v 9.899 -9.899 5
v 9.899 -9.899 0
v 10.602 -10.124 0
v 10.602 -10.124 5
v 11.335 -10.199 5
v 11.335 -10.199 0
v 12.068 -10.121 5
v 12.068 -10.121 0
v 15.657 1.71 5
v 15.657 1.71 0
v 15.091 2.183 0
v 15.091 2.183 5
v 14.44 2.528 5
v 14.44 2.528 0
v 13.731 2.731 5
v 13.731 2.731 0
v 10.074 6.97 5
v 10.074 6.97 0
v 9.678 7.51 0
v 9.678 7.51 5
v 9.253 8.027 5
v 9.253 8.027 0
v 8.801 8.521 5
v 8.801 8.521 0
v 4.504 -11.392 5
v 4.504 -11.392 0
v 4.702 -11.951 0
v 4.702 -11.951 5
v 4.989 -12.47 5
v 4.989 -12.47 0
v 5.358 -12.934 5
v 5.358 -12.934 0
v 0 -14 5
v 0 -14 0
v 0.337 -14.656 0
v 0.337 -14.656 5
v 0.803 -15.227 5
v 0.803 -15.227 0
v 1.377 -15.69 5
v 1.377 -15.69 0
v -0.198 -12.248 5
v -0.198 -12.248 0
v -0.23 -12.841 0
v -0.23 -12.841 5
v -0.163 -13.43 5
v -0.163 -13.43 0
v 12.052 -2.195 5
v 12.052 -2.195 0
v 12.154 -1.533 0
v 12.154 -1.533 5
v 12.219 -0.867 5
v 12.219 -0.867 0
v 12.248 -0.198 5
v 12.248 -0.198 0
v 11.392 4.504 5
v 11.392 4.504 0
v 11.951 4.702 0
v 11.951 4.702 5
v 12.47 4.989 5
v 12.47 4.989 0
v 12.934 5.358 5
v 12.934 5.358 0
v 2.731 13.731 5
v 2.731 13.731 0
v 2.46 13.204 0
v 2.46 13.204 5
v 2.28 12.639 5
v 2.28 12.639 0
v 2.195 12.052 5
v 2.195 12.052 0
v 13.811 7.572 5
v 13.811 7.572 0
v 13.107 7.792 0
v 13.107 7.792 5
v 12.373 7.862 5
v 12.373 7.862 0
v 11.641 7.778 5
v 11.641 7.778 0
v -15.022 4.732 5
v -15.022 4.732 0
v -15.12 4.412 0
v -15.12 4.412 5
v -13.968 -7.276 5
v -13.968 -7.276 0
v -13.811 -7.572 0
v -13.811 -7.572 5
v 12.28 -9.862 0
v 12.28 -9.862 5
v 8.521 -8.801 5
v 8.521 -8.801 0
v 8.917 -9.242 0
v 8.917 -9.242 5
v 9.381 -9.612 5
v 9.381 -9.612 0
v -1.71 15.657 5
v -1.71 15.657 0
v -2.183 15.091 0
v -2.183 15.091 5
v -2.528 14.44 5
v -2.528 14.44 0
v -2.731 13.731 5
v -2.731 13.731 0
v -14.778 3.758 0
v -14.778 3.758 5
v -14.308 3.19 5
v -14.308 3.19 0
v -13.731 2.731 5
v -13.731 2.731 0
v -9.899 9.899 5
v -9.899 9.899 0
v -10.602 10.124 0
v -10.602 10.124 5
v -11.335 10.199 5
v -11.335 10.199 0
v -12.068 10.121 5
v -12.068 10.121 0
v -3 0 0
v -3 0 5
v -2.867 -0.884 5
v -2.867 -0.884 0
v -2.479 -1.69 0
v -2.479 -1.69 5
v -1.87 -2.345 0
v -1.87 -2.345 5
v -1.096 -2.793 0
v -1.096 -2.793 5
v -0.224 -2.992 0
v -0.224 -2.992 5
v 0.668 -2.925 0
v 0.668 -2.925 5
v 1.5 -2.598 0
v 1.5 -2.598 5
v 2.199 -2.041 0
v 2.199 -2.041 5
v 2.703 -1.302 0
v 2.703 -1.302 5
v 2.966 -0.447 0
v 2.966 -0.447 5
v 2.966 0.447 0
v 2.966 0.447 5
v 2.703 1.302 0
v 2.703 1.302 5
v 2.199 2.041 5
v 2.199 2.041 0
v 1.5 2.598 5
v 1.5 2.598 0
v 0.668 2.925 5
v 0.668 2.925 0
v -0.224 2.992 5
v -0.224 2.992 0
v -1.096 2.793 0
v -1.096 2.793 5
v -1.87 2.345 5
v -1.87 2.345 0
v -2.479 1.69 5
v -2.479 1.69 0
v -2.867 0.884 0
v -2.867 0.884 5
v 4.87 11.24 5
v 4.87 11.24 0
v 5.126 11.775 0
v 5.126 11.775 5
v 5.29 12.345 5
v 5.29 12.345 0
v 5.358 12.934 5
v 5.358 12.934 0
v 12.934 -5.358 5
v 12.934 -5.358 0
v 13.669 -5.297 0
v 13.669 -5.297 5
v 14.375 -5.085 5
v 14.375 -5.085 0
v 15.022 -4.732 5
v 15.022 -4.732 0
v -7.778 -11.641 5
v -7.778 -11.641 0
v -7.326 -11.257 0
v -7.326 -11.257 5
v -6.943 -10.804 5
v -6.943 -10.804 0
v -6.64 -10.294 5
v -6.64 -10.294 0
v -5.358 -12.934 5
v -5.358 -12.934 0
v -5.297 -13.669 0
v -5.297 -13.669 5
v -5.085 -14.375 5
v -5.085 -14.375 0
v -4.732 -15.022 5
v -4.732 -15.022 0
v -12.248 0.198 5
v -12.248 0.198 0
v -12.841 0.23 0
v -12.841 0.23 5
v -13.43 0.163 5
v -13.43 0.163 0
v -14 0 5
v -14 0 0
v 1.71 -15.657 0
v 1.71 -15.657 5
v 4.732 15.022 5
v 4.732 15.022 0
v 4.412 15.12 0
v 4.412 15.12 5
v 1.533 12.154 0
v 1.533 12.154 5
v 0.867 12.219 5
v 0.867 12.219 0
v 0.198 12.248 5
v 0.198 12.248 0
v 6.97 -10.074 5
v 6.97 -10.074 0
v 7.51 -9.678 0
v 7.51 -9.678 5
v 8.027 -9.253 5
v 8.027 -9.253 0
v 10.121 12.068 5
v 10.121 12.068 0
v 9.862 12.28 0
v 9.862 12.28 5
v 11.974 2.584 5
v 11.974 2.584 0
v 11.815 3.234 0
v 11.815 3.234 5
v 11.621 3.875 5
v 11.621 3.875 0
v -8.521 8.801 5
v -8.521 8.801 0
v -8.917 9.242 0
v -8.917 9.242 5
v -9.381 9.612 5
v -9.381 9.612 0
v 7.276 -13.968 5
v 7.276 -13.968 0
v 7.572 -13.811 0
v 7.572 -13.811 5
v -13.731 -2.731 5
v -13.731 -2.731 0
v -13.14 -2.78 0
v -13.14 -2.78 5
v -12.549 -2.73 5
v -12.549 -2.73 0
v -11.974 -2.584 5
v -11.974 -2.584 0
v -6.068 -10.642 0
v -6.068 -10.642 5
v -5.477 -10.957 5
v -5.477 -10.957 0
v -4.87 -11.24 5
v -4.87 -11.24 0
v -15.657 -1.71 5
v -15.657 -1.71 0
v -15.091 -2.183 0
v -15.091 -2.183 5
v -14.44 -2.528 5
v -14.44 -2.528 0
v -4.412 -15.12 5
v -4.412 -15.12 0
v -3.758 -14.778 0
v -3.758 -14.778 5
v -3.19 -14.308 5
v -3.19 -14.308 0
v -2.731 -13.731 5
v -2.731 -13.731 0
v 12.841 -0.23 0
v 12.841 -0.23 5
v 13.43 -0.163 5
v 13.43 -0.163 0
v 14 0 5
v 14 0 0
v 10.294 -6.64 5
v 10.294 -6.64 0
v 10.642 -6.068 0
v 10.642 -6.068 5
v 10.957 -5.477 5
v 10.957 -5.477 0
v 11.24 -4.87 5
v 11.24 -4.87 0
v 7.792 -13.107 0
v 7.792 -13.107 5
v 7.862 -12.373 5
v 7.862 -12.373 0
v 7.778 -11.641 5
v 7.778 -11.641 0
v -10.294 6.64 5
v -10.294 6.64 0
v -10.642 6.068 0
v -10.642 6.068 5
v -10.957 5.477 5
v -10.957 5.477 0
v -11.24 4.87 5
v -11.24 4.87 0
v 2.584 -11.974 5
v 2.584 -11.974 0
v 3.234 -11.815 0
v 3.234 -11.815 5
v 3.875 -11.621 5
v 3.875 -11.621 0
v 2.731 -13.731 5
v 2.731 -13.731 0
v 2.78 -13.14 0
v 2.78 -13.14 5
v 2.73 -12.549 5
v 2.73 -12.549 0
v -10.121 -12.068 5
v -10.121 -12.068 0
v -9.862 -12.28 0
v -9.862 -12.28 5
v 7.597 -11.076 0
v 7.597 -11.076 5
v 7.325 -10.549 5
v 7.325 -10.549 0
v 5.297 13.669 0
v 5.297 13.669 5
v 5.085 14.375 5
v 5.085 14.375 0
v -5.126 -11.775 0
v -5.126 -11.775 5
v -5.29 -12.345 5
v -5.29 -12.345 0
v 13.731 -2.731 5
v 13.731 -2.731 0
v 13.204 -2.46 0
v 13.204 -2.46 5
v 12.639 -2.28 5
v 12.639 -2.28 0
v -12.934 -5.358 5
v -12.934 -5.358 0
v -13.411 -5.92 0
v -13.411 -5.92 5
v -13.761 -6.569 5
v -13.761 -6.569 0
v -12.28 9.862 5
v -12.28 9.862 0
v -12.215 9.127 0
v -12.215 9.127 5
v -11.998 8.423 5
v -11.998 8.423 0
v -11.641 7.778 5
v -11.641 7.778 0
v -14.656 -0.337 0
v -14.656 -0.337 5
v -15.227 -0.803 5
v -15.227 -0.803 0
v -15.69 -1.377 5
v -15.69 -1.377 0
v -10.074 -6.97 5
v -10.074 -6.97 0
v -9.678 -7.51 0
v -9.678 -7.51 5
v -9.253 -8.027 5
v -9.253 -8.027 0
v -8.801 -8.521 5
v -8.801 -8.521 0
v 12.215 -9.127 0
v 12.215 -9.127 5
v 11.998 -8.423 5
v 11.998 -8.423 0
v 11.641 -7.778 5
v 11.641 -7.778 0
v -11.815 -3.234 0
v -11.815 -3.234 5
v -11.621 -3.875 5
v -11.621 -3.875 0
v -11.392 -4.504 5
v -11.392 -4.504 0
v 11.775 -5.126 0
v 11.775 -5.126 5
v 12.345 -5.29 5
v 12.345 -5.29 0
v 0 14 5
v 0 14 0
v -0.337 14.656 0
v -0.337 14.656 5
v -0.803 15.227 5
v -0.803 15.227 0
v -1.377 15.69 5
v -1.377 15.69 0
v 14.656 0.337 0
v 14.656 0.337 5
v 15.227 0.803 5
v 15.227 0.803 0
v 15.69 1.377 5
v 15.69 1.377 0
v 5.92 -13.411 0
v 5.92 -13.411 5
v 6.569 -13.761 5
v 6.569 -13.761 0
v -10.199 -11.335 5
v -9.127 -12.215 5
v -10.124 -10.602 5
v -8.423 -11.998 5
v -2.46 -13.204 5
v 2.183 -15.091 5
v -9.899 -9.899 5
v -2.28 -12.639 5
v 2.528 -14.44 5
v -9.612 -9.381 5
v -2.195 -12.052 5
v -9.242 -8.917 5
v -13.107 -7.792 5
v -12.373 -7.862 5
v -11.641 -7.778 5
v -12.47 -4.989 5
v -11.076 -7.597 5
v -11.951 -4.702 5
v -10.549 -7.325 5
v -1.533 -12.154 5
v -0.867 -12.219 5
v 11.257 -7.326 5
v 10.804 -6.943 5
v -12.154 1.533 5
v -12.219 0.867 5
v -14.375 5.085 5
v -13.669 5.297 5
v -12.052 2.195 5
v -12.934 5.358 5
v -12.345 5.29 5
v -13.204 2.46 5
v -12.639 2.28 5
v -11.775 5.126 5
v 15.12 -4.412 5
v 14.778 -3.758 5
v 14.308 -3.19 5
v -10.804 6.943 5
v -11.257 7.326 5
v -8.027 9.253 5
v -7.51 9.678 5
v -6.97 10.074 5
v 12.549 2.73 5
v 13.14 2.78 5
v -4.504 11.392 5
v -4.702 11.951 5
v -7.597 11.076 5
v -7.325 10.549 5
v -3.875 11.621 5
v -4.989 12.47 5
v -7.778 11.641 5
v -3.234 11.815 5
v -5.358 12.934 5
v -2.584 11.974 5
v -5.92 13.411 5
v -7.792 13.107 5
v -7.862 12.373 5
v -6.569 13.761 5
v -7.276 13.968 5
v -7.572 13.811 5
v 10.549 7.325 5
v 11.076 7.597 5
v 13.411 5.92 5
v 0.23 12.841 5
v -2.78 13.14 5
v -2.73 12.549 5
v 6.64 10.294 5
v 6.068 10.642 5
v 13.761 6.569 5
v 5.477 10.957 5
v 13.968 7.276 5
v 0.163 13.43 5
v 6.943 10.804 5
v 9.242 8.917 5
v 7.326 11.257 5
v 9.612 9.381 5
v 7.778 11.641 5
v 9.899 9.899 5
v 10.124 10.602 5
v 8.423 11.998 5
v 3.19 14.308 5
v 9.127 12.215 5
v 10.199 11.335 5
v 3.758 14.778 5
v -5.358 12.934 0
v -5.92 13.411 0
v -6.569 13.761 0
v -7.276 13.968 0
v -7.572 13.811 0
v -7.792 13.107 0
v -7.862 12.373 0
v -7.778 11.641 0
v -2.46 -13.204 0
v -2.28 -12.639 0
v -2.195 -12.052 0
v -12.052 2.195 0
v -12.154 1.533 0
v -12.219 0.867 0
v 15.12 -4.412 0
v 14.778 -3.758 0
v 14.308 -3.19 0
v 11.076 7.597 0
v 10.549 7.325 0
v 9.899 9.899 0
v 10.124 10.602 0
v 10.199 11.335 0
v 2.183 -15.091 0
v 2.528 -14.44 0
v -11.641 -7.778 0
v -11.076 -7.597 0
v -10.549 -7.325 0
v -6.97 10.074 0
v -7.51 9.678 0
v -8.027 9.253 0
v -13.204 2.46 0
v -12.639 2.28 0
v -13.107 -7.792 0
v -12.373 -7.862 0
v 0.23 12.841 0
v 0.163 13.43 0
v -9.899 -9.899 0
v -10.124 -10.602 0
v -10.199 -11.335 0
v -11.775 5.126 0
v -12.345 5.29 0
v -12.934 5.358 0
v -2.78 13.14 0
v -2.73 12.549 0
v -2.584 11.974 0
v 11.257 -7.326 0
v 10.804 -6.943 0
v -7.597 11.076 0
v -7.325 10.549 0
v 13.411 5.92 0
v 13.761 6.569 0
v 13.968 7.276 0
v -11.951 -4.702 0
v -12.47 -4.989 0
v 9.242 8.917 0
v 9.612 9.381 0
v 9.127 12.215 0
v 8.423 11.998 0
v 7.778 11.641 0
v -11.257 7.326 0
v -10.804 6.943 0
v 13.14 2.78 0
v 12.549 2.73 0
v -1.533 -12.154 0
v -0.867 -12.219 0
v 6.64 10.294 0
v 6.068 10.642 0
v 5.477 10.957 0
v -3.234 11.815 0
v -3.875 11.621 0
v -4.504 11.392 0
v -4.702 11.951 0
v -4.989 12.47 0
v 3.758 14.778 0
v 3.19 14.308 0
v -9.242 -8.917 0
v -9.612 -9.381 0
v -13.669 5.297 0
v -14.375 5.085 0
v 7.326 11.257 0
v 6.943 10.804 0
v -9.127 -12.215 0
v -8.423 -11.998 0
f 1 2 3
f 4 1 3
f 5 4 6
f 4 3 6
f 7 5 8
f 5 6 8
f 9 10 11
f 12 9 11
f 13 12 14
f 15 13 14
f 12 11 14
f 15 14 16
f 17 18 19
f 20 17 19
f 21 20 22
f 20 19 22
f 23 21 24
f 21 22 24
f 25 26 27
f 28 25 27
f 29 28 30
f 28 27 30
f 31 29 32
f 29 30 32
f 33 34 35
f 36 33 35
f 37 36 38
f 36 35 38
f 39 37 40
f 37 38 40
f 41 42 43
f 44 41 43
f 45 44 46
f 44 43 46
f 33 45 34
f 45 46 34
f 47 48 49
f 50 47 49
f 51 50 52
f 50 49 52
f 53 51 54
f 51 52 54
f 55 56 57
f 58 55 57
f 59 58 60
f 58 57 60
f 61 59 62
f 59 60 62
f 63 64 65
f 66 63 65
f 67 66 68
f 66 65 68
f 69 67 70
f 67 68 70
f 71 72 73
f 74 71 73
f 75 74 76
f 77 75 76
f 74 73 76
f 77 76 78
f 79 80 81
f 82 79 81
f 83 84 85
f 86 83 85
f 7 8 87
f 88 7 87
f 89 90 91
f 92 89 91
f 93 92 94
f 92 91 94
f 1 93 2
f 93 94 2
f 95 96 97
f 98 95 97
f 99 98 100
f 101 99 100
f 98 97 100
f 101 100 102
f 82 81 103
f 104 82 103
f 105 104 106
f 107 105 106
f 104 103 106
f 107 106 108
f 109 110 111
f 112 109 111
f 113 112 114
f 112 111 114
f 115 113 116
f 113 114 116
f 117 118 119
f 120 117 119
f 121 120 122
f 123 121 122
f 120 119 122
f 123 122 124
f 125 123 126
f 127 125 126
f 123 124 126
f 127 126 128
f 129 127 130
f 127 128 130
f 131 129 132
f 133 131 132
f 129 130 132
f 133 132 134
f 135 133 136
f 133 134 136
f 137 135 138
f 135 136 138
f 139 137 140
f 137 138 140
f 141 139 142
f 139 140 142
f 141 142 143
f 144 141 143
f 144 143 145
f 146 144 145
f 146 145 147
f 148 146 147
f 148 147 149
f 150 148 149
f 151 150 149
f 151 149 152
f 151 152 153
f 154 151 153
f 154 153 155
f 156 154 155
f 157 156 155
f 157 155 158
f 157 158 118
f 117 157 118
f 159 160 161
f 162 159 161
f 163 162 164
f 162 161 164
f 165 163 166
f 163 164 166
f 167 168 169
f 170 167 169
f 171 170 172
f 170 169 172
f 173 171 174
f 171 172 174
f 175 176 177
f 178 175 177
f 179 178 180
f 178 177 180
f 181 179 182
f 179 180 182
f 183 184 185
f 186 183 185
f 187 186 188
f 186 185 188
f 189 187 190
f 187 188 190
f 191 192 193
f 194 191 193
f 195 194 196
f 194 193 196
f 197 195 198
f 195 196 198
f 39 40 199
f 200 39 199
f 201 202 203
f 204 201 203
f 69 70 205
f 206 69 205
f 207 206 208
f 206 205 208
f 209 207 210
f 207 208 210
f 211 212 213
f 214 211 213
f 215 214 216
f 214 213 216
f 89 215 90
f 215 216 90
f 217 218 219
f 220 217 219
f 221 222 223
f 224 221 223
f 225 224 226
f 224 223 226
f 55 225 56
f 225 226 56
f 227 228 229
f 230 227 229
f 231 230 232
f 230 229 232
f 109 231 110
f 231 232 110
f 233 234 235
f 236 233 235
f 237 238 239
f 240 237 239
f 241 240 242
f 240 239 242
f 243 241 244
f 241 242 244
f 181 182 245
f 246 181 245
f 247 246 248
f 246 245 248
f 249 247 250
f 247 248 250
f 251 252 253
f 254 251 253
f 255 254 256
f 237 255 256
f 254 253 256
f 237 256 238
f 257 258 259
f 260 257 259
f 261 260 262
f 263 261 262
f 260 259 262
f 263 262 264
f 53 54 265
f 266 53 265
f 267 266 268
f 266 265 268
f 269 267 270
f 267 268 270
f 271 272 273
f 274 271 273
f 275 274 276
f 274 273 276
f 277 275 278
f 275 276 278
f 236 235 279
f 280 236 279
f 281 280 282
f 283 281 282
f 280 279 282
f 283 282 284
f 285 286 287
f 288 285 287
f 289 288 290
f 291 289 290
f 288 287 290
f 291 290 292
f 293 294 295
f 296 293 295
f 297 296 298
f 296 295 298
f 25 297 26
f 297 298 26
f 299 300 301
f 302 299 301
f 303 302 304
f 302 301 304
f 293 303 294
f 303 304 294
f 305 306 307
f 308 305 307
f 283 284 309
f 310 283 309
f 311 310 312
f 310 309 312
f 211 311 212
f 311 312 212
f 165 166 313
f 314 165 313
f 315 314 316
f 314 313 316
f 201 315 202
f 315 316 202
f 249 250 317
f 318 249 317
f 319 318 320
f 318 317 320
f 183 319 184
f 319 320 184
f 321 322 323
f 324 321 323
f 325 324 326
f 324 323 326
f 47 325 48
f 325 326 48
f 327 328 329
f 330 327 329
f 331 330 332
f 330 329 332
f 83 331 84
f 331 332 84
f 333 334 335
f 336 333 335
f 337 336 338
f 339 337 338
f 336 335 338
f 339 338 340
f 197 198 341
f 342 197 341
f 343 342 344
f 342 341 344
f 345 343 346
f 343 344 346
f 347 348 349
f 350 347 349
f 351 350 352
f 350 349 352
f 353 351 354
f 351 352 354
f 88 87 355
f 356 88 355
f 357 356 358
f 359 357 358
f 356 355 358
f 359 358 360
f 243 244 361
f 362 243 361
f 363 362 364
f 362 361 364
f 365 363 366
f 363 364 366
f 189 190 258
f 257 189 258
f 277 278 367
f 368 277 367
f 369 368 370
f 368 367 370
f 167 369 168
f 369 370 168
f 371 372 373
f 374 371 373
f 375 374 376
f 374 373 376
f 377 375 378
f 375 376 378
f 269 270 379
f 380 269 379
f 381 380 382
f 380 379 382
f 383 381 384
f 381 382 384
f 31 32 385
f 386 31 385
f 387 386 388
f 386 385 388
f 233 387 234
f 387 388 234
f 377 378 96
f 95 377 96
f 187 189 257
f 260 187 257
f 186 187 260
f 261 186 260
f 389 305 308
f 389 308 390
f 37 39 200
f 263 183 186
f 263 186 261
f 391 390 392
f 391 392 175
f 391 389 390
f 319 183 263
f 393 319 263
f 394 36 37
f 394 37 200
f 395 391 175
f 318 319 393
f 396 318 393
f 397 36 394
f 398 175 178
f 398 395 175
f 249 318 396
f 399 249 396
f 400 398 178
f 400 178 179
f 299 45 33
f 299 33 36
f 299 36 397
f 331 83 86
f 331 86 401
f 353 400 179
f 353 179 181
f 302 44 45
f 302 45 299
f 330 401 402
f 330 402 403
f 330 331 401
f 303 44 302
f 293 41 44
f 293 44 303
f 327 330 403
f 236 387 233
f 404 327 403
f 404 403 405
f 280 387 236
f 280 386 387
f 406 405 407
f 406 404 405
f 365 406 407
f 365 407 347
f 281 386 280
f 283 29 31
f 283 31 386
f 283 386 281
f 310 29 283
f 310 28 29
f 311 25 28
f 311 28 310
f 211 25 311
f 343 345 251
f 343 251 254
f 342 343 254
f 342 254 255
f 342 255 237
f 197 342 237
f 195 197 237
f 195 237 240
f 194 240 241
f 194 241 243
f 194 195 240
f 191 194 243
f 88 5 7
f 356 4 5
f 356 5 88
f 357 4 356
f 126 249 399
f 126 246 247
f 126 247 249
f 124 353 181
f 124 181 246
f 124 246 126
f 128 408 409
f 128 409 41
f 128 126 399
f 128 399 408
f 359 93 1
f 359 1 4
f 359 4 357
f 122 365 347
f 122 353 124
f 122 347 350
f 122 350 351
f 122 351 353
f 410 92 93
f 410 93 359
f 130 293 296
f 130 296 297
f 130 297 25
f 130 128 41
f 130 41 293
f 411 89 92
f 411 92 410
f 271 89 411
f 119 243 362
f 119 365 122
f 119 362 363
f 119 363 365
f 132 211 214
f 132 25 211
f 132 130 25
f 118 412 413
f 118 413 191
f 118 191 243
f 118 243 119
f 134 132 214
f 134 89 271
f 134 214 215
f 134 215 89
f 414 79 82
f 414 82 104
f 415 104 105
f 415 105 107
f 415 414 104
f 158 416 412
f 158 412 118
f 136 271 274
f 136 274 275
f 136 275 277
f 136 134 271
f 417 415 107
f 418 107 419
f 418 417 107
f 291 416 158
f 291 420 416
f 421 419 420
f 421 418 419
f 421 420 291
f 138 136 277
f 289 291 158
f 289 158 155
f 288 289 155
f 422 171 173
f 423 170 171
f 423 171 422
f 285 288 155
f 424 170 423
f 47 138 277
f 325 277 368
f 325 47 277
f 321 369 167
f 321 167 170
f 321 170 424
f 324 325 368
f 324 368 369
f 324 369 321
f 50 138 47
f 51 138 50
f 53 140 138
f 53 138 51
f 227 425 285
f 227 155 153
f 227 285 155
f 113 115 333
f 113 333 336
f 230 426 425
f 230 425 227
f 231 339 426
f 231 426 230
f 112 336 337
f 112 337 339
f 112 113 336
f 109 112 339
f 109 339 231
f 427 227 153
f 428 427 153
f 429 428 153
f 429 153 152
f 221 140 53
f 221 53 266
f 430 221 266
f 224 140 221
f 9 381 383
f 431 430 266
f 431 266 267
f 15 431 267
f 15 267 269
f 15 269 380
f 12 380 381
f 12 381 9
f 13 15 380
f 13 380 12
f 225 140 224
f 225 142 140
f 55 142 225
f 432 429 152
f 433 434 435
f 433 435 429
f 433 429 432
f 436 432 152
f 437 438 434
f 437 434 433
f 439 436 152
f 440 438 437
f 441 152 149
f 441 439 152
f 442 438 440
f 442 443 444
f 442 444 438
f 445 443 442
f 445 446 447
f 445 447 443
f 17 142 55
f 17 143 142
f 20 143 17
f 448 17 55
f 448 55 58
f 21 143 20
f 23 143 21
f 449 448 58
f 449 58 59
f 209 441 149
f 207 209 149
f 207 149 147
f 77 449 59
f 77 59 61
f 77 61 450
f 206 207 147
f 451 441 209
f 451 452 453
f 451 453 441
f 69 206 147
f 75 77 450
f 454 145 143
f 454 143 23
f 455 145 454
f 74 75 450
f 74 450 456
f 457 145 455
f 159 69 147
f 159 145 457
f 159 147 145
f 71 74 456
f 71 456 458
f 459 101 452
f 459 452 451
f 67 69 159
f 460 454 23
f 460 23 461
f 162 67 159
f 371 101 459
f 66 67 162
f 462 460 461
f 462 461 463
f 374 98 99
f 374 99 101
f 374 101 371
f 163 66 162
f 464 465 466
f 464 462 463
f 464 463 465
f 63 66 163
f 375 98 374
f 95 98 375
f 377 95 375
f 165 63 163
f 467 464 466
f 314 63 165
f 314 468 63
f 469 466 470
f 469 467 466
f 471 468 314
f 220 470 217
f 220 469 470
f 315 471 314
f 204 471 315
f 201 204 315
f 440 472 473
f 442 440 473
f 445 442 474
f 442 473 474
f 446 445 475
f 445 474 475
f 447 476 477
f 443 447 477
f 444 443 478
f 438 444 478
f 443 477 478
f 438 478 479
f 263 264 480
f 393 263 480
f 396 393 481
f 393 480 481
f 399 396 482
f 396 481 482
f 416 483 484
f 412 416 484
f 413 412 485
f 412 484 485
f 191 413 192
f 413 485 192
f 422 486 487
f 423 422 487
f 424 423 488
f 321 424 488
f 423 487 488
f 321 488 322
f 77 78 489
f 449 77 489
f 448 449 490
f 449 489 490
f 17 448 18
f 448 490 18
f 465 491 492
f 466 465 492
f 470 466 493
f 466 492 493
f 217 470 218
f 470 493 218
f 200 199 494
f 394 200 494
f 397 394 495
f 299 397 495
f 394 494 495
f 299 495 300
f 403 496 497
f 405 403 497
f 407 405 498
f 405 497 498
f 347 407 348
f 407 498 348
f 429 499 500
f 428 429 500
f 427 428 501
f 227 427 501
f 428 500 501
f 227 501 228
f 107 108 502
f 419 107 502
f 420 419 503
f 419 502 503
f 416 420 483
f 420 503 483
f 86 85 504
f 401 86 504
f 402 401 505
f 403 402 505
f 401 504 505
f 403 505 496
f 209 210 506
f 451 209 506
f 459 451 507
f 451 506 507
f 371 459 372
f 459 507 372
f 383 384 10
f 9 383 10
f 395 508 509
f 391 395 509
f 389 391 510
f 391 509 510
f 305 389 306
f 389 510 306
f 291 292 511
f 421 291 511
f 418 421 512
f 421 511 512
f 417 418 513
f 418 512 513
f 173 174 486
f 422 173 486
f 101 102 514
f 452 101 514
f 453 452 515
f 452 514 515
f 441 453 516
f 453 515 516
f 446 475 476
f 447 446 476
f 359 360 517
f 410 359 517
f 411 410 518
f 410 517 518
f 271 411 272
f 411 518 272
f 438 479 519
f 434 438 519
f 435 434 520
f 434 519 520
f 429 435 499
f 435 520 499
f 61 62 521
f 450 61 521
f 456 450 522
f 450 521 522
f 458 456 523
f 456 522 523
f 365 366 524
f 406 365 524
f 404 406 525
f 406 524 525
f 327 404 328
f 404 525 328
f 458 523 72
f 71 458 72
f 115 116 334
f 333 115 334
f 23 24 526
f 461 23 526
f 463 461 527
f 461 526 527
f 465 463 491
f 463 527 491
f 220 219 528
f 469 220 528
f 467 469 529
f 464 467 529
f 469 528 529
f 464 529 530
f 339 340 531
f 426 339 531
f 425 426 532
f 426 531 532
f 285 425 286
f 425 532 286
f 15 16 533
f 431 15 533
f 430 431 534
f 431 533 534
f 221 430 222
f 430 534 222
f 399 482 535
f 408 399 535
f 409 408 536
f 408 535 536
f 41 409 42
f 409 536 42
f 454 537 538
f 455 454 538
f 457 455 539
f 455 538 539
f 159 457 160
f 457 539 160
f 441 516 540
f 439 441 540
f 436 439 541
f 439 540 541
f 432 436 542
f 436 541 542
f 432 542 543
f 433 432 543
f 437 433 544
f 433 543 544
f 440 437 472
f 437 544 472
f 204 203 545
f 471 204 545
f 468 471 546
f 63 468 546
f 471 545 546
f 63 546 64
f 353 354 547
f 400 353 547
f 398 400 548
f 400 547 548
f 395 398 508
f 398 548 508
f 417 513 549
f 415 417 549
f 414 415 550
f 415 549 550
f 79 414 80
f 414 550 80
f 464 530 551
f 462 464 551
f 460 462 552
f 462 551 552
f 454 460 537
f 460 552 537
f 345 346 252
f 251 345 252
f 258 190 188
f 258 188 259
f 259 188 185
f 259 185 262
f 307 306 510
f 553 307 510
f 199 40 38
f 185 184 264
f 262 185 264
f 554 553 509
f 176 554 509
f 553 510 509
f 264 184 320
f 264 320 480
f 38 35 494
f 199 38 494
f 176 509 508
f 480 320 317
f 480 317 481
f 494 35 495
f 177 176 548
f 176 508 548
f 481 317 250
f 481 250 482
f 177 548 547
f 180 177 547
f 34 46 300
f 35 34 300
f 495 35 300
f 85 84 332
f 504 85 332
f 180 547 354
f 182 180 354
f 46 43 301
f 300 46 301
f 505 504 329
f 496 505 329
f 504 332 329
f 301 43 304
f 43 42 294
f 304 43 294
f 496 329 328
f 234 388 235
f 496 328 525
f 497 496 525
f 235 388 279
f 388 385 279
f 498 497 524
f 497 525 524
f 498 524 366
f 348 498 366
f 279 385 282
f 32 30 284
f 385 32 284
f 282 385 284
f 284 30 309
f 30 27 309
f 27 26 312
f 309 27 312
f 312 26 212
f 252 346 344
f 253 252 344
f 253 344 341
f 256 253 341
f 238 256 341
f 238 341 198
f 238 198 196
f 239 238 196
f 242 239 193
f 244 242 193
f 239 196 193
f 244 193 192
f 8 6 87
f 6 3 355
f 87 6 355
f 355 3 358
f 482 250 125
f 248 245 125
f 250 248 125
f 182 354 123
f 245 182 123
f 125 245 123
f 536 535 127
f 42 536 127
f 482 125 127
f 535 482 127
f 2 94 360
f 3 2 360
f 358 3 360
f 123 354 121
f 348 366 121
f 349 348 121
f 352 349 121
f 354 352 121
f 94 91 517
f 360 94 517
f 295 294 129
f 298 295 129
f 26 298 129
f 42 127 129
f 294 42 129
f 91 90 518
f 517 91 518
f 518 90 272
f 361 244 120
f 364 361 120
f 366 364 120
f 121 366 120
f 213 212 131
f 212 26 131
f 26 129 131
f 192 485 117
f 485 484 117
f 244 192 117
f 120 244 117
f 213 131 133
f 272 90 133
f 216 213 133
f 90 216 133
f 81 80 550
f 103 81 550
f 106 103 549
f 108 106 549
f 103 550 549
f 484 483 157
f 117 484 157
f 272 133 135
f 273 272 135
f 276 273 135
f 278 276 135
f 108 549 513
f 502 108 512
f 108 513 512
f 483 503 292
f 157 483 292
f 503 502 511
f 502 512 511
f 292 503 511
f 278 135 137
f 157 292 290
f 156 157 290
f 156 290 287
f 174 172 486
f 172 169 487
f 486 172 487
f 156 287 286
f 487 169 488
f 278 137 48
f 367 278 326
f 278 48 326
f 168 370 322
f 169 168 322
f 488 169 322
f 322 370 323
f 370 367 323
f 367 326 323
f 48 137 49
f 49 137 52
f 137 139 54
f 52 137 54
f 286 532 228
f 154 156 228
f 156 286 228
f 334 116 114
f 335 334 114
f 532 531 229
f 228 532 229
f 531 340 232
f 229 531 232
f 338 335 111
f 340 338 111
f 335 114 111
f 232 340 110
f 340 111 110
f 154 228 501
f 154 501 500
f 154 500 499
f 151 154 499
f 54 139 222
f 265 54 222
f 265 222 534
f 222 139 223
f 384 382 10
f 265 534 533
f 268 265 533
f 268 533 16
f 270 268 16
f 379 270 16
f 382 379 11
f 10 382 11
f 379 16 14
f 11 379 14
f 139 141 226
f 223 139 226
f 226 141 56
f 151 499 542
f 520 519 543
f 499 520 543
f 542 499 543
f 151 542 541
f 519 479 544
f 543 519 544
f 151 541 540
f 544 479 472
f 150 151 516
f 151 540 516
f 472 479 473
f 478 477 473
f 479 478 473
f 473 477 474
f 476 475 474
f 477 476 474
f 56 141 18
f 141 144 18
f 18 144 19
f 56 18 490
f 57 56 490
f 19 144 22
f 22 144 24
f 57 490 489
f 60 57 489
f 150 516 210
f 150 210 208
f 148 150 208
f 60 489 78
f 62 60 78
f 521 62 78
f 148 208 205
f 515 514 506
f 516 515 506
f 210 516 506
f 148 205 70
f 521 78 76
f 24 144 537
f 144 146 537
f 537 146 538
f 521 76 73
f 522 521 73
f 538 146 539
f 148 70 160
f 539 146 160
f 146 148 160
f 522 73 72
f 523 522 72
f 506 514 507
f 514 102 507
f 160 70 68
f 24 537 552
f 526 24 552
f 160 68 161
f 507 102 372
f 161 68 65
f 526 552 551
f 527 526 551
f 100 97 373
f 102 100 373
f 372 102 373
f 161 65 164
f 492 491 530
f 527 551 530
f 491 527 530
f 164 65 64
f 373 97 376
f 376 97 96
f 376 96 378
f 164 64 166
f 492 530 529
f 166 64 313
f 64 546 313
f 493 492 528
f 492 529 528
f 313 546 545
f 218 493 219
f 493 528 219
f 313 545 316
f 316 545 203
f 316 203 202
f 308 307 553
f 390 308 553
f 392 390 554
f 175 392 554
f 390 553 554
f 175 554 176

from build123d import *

# Parameters (mm, degrees)
F1_DEPTH = 5
F2_DEPTH = 5
F3_COUNT = 16
F5_D     = 6


with BuildPart() as f1:
    # F0 (on Top) → F1 (new body)
    with BuildSketch(Plane.XY):
        with BuildLine():
            ThreePointArc((-2.5837804825, 11.9744134895), (-7.6945171742, -9.5318888713), (12.25, 0))
            ThreePointArc((12.25, 0), (8.7317956514, 8.59175446), (0.1980416814, 12.2483990583))
            ThreePointArc((0.1980416814, 12.2483990583), (-1.200709969, 12.1910129017), (-2.5837804825, 11.9744134895))
        make_face()
    extrude(amount=F1_DEPTH)

    # F0 (on Top) → F2 (join)
    with BuildSketch(Plane.XY):
        with BuildLine():
            ThreePointArc((-2.5837804825, 11.9744134895), (-1.200709969, 12.1910129017), (0.1980416814, 12.2483990583))
            ThreePointArc((0.1980416814, 12.2483990583), (0.208626449, 13.1365918946), (0, 14))
            ThreePointArc((0, 14), (-0.5553297077, 14.953396215), (-1.3770560583, 15.6896850387))
            Line((-1.3770560583, 15.6896850387), (-1.7103093943, 15.6568624499))
            ThreePointArc((-1.7103093943, 15.6568624499), (-2.3726036798, 14.7744103512), (-2.7312645082, 13.7309939256))
            ThreePointArc((-2.7312645082, 13.7309939256), (-2.7674396932, 12.8434749638), (-2.5837804825, 11.9744134895))
        make_face()
    extrude(amount=F2_DEPTH)

    # F3: F1 ×16 about axis
    f3_axis = Axis((0, 0, 5), (0, 0, -1))


with BuildPart() as f1_1:
    add(f1.part)
    for i in range(1, F3_COUNT):
        add(f1.part.rotate(f3_axis, i * 360 / F3_COUNT))

    # F5 (through all)
    with Locations(Plane(origin=(0, 0, 0), x_dir=(1, 0, 0), z_dir=(0, 0, -1))):
        with Locations((0, 0)):
            Hole(F5_D / 2)


solid = f1_1.part
